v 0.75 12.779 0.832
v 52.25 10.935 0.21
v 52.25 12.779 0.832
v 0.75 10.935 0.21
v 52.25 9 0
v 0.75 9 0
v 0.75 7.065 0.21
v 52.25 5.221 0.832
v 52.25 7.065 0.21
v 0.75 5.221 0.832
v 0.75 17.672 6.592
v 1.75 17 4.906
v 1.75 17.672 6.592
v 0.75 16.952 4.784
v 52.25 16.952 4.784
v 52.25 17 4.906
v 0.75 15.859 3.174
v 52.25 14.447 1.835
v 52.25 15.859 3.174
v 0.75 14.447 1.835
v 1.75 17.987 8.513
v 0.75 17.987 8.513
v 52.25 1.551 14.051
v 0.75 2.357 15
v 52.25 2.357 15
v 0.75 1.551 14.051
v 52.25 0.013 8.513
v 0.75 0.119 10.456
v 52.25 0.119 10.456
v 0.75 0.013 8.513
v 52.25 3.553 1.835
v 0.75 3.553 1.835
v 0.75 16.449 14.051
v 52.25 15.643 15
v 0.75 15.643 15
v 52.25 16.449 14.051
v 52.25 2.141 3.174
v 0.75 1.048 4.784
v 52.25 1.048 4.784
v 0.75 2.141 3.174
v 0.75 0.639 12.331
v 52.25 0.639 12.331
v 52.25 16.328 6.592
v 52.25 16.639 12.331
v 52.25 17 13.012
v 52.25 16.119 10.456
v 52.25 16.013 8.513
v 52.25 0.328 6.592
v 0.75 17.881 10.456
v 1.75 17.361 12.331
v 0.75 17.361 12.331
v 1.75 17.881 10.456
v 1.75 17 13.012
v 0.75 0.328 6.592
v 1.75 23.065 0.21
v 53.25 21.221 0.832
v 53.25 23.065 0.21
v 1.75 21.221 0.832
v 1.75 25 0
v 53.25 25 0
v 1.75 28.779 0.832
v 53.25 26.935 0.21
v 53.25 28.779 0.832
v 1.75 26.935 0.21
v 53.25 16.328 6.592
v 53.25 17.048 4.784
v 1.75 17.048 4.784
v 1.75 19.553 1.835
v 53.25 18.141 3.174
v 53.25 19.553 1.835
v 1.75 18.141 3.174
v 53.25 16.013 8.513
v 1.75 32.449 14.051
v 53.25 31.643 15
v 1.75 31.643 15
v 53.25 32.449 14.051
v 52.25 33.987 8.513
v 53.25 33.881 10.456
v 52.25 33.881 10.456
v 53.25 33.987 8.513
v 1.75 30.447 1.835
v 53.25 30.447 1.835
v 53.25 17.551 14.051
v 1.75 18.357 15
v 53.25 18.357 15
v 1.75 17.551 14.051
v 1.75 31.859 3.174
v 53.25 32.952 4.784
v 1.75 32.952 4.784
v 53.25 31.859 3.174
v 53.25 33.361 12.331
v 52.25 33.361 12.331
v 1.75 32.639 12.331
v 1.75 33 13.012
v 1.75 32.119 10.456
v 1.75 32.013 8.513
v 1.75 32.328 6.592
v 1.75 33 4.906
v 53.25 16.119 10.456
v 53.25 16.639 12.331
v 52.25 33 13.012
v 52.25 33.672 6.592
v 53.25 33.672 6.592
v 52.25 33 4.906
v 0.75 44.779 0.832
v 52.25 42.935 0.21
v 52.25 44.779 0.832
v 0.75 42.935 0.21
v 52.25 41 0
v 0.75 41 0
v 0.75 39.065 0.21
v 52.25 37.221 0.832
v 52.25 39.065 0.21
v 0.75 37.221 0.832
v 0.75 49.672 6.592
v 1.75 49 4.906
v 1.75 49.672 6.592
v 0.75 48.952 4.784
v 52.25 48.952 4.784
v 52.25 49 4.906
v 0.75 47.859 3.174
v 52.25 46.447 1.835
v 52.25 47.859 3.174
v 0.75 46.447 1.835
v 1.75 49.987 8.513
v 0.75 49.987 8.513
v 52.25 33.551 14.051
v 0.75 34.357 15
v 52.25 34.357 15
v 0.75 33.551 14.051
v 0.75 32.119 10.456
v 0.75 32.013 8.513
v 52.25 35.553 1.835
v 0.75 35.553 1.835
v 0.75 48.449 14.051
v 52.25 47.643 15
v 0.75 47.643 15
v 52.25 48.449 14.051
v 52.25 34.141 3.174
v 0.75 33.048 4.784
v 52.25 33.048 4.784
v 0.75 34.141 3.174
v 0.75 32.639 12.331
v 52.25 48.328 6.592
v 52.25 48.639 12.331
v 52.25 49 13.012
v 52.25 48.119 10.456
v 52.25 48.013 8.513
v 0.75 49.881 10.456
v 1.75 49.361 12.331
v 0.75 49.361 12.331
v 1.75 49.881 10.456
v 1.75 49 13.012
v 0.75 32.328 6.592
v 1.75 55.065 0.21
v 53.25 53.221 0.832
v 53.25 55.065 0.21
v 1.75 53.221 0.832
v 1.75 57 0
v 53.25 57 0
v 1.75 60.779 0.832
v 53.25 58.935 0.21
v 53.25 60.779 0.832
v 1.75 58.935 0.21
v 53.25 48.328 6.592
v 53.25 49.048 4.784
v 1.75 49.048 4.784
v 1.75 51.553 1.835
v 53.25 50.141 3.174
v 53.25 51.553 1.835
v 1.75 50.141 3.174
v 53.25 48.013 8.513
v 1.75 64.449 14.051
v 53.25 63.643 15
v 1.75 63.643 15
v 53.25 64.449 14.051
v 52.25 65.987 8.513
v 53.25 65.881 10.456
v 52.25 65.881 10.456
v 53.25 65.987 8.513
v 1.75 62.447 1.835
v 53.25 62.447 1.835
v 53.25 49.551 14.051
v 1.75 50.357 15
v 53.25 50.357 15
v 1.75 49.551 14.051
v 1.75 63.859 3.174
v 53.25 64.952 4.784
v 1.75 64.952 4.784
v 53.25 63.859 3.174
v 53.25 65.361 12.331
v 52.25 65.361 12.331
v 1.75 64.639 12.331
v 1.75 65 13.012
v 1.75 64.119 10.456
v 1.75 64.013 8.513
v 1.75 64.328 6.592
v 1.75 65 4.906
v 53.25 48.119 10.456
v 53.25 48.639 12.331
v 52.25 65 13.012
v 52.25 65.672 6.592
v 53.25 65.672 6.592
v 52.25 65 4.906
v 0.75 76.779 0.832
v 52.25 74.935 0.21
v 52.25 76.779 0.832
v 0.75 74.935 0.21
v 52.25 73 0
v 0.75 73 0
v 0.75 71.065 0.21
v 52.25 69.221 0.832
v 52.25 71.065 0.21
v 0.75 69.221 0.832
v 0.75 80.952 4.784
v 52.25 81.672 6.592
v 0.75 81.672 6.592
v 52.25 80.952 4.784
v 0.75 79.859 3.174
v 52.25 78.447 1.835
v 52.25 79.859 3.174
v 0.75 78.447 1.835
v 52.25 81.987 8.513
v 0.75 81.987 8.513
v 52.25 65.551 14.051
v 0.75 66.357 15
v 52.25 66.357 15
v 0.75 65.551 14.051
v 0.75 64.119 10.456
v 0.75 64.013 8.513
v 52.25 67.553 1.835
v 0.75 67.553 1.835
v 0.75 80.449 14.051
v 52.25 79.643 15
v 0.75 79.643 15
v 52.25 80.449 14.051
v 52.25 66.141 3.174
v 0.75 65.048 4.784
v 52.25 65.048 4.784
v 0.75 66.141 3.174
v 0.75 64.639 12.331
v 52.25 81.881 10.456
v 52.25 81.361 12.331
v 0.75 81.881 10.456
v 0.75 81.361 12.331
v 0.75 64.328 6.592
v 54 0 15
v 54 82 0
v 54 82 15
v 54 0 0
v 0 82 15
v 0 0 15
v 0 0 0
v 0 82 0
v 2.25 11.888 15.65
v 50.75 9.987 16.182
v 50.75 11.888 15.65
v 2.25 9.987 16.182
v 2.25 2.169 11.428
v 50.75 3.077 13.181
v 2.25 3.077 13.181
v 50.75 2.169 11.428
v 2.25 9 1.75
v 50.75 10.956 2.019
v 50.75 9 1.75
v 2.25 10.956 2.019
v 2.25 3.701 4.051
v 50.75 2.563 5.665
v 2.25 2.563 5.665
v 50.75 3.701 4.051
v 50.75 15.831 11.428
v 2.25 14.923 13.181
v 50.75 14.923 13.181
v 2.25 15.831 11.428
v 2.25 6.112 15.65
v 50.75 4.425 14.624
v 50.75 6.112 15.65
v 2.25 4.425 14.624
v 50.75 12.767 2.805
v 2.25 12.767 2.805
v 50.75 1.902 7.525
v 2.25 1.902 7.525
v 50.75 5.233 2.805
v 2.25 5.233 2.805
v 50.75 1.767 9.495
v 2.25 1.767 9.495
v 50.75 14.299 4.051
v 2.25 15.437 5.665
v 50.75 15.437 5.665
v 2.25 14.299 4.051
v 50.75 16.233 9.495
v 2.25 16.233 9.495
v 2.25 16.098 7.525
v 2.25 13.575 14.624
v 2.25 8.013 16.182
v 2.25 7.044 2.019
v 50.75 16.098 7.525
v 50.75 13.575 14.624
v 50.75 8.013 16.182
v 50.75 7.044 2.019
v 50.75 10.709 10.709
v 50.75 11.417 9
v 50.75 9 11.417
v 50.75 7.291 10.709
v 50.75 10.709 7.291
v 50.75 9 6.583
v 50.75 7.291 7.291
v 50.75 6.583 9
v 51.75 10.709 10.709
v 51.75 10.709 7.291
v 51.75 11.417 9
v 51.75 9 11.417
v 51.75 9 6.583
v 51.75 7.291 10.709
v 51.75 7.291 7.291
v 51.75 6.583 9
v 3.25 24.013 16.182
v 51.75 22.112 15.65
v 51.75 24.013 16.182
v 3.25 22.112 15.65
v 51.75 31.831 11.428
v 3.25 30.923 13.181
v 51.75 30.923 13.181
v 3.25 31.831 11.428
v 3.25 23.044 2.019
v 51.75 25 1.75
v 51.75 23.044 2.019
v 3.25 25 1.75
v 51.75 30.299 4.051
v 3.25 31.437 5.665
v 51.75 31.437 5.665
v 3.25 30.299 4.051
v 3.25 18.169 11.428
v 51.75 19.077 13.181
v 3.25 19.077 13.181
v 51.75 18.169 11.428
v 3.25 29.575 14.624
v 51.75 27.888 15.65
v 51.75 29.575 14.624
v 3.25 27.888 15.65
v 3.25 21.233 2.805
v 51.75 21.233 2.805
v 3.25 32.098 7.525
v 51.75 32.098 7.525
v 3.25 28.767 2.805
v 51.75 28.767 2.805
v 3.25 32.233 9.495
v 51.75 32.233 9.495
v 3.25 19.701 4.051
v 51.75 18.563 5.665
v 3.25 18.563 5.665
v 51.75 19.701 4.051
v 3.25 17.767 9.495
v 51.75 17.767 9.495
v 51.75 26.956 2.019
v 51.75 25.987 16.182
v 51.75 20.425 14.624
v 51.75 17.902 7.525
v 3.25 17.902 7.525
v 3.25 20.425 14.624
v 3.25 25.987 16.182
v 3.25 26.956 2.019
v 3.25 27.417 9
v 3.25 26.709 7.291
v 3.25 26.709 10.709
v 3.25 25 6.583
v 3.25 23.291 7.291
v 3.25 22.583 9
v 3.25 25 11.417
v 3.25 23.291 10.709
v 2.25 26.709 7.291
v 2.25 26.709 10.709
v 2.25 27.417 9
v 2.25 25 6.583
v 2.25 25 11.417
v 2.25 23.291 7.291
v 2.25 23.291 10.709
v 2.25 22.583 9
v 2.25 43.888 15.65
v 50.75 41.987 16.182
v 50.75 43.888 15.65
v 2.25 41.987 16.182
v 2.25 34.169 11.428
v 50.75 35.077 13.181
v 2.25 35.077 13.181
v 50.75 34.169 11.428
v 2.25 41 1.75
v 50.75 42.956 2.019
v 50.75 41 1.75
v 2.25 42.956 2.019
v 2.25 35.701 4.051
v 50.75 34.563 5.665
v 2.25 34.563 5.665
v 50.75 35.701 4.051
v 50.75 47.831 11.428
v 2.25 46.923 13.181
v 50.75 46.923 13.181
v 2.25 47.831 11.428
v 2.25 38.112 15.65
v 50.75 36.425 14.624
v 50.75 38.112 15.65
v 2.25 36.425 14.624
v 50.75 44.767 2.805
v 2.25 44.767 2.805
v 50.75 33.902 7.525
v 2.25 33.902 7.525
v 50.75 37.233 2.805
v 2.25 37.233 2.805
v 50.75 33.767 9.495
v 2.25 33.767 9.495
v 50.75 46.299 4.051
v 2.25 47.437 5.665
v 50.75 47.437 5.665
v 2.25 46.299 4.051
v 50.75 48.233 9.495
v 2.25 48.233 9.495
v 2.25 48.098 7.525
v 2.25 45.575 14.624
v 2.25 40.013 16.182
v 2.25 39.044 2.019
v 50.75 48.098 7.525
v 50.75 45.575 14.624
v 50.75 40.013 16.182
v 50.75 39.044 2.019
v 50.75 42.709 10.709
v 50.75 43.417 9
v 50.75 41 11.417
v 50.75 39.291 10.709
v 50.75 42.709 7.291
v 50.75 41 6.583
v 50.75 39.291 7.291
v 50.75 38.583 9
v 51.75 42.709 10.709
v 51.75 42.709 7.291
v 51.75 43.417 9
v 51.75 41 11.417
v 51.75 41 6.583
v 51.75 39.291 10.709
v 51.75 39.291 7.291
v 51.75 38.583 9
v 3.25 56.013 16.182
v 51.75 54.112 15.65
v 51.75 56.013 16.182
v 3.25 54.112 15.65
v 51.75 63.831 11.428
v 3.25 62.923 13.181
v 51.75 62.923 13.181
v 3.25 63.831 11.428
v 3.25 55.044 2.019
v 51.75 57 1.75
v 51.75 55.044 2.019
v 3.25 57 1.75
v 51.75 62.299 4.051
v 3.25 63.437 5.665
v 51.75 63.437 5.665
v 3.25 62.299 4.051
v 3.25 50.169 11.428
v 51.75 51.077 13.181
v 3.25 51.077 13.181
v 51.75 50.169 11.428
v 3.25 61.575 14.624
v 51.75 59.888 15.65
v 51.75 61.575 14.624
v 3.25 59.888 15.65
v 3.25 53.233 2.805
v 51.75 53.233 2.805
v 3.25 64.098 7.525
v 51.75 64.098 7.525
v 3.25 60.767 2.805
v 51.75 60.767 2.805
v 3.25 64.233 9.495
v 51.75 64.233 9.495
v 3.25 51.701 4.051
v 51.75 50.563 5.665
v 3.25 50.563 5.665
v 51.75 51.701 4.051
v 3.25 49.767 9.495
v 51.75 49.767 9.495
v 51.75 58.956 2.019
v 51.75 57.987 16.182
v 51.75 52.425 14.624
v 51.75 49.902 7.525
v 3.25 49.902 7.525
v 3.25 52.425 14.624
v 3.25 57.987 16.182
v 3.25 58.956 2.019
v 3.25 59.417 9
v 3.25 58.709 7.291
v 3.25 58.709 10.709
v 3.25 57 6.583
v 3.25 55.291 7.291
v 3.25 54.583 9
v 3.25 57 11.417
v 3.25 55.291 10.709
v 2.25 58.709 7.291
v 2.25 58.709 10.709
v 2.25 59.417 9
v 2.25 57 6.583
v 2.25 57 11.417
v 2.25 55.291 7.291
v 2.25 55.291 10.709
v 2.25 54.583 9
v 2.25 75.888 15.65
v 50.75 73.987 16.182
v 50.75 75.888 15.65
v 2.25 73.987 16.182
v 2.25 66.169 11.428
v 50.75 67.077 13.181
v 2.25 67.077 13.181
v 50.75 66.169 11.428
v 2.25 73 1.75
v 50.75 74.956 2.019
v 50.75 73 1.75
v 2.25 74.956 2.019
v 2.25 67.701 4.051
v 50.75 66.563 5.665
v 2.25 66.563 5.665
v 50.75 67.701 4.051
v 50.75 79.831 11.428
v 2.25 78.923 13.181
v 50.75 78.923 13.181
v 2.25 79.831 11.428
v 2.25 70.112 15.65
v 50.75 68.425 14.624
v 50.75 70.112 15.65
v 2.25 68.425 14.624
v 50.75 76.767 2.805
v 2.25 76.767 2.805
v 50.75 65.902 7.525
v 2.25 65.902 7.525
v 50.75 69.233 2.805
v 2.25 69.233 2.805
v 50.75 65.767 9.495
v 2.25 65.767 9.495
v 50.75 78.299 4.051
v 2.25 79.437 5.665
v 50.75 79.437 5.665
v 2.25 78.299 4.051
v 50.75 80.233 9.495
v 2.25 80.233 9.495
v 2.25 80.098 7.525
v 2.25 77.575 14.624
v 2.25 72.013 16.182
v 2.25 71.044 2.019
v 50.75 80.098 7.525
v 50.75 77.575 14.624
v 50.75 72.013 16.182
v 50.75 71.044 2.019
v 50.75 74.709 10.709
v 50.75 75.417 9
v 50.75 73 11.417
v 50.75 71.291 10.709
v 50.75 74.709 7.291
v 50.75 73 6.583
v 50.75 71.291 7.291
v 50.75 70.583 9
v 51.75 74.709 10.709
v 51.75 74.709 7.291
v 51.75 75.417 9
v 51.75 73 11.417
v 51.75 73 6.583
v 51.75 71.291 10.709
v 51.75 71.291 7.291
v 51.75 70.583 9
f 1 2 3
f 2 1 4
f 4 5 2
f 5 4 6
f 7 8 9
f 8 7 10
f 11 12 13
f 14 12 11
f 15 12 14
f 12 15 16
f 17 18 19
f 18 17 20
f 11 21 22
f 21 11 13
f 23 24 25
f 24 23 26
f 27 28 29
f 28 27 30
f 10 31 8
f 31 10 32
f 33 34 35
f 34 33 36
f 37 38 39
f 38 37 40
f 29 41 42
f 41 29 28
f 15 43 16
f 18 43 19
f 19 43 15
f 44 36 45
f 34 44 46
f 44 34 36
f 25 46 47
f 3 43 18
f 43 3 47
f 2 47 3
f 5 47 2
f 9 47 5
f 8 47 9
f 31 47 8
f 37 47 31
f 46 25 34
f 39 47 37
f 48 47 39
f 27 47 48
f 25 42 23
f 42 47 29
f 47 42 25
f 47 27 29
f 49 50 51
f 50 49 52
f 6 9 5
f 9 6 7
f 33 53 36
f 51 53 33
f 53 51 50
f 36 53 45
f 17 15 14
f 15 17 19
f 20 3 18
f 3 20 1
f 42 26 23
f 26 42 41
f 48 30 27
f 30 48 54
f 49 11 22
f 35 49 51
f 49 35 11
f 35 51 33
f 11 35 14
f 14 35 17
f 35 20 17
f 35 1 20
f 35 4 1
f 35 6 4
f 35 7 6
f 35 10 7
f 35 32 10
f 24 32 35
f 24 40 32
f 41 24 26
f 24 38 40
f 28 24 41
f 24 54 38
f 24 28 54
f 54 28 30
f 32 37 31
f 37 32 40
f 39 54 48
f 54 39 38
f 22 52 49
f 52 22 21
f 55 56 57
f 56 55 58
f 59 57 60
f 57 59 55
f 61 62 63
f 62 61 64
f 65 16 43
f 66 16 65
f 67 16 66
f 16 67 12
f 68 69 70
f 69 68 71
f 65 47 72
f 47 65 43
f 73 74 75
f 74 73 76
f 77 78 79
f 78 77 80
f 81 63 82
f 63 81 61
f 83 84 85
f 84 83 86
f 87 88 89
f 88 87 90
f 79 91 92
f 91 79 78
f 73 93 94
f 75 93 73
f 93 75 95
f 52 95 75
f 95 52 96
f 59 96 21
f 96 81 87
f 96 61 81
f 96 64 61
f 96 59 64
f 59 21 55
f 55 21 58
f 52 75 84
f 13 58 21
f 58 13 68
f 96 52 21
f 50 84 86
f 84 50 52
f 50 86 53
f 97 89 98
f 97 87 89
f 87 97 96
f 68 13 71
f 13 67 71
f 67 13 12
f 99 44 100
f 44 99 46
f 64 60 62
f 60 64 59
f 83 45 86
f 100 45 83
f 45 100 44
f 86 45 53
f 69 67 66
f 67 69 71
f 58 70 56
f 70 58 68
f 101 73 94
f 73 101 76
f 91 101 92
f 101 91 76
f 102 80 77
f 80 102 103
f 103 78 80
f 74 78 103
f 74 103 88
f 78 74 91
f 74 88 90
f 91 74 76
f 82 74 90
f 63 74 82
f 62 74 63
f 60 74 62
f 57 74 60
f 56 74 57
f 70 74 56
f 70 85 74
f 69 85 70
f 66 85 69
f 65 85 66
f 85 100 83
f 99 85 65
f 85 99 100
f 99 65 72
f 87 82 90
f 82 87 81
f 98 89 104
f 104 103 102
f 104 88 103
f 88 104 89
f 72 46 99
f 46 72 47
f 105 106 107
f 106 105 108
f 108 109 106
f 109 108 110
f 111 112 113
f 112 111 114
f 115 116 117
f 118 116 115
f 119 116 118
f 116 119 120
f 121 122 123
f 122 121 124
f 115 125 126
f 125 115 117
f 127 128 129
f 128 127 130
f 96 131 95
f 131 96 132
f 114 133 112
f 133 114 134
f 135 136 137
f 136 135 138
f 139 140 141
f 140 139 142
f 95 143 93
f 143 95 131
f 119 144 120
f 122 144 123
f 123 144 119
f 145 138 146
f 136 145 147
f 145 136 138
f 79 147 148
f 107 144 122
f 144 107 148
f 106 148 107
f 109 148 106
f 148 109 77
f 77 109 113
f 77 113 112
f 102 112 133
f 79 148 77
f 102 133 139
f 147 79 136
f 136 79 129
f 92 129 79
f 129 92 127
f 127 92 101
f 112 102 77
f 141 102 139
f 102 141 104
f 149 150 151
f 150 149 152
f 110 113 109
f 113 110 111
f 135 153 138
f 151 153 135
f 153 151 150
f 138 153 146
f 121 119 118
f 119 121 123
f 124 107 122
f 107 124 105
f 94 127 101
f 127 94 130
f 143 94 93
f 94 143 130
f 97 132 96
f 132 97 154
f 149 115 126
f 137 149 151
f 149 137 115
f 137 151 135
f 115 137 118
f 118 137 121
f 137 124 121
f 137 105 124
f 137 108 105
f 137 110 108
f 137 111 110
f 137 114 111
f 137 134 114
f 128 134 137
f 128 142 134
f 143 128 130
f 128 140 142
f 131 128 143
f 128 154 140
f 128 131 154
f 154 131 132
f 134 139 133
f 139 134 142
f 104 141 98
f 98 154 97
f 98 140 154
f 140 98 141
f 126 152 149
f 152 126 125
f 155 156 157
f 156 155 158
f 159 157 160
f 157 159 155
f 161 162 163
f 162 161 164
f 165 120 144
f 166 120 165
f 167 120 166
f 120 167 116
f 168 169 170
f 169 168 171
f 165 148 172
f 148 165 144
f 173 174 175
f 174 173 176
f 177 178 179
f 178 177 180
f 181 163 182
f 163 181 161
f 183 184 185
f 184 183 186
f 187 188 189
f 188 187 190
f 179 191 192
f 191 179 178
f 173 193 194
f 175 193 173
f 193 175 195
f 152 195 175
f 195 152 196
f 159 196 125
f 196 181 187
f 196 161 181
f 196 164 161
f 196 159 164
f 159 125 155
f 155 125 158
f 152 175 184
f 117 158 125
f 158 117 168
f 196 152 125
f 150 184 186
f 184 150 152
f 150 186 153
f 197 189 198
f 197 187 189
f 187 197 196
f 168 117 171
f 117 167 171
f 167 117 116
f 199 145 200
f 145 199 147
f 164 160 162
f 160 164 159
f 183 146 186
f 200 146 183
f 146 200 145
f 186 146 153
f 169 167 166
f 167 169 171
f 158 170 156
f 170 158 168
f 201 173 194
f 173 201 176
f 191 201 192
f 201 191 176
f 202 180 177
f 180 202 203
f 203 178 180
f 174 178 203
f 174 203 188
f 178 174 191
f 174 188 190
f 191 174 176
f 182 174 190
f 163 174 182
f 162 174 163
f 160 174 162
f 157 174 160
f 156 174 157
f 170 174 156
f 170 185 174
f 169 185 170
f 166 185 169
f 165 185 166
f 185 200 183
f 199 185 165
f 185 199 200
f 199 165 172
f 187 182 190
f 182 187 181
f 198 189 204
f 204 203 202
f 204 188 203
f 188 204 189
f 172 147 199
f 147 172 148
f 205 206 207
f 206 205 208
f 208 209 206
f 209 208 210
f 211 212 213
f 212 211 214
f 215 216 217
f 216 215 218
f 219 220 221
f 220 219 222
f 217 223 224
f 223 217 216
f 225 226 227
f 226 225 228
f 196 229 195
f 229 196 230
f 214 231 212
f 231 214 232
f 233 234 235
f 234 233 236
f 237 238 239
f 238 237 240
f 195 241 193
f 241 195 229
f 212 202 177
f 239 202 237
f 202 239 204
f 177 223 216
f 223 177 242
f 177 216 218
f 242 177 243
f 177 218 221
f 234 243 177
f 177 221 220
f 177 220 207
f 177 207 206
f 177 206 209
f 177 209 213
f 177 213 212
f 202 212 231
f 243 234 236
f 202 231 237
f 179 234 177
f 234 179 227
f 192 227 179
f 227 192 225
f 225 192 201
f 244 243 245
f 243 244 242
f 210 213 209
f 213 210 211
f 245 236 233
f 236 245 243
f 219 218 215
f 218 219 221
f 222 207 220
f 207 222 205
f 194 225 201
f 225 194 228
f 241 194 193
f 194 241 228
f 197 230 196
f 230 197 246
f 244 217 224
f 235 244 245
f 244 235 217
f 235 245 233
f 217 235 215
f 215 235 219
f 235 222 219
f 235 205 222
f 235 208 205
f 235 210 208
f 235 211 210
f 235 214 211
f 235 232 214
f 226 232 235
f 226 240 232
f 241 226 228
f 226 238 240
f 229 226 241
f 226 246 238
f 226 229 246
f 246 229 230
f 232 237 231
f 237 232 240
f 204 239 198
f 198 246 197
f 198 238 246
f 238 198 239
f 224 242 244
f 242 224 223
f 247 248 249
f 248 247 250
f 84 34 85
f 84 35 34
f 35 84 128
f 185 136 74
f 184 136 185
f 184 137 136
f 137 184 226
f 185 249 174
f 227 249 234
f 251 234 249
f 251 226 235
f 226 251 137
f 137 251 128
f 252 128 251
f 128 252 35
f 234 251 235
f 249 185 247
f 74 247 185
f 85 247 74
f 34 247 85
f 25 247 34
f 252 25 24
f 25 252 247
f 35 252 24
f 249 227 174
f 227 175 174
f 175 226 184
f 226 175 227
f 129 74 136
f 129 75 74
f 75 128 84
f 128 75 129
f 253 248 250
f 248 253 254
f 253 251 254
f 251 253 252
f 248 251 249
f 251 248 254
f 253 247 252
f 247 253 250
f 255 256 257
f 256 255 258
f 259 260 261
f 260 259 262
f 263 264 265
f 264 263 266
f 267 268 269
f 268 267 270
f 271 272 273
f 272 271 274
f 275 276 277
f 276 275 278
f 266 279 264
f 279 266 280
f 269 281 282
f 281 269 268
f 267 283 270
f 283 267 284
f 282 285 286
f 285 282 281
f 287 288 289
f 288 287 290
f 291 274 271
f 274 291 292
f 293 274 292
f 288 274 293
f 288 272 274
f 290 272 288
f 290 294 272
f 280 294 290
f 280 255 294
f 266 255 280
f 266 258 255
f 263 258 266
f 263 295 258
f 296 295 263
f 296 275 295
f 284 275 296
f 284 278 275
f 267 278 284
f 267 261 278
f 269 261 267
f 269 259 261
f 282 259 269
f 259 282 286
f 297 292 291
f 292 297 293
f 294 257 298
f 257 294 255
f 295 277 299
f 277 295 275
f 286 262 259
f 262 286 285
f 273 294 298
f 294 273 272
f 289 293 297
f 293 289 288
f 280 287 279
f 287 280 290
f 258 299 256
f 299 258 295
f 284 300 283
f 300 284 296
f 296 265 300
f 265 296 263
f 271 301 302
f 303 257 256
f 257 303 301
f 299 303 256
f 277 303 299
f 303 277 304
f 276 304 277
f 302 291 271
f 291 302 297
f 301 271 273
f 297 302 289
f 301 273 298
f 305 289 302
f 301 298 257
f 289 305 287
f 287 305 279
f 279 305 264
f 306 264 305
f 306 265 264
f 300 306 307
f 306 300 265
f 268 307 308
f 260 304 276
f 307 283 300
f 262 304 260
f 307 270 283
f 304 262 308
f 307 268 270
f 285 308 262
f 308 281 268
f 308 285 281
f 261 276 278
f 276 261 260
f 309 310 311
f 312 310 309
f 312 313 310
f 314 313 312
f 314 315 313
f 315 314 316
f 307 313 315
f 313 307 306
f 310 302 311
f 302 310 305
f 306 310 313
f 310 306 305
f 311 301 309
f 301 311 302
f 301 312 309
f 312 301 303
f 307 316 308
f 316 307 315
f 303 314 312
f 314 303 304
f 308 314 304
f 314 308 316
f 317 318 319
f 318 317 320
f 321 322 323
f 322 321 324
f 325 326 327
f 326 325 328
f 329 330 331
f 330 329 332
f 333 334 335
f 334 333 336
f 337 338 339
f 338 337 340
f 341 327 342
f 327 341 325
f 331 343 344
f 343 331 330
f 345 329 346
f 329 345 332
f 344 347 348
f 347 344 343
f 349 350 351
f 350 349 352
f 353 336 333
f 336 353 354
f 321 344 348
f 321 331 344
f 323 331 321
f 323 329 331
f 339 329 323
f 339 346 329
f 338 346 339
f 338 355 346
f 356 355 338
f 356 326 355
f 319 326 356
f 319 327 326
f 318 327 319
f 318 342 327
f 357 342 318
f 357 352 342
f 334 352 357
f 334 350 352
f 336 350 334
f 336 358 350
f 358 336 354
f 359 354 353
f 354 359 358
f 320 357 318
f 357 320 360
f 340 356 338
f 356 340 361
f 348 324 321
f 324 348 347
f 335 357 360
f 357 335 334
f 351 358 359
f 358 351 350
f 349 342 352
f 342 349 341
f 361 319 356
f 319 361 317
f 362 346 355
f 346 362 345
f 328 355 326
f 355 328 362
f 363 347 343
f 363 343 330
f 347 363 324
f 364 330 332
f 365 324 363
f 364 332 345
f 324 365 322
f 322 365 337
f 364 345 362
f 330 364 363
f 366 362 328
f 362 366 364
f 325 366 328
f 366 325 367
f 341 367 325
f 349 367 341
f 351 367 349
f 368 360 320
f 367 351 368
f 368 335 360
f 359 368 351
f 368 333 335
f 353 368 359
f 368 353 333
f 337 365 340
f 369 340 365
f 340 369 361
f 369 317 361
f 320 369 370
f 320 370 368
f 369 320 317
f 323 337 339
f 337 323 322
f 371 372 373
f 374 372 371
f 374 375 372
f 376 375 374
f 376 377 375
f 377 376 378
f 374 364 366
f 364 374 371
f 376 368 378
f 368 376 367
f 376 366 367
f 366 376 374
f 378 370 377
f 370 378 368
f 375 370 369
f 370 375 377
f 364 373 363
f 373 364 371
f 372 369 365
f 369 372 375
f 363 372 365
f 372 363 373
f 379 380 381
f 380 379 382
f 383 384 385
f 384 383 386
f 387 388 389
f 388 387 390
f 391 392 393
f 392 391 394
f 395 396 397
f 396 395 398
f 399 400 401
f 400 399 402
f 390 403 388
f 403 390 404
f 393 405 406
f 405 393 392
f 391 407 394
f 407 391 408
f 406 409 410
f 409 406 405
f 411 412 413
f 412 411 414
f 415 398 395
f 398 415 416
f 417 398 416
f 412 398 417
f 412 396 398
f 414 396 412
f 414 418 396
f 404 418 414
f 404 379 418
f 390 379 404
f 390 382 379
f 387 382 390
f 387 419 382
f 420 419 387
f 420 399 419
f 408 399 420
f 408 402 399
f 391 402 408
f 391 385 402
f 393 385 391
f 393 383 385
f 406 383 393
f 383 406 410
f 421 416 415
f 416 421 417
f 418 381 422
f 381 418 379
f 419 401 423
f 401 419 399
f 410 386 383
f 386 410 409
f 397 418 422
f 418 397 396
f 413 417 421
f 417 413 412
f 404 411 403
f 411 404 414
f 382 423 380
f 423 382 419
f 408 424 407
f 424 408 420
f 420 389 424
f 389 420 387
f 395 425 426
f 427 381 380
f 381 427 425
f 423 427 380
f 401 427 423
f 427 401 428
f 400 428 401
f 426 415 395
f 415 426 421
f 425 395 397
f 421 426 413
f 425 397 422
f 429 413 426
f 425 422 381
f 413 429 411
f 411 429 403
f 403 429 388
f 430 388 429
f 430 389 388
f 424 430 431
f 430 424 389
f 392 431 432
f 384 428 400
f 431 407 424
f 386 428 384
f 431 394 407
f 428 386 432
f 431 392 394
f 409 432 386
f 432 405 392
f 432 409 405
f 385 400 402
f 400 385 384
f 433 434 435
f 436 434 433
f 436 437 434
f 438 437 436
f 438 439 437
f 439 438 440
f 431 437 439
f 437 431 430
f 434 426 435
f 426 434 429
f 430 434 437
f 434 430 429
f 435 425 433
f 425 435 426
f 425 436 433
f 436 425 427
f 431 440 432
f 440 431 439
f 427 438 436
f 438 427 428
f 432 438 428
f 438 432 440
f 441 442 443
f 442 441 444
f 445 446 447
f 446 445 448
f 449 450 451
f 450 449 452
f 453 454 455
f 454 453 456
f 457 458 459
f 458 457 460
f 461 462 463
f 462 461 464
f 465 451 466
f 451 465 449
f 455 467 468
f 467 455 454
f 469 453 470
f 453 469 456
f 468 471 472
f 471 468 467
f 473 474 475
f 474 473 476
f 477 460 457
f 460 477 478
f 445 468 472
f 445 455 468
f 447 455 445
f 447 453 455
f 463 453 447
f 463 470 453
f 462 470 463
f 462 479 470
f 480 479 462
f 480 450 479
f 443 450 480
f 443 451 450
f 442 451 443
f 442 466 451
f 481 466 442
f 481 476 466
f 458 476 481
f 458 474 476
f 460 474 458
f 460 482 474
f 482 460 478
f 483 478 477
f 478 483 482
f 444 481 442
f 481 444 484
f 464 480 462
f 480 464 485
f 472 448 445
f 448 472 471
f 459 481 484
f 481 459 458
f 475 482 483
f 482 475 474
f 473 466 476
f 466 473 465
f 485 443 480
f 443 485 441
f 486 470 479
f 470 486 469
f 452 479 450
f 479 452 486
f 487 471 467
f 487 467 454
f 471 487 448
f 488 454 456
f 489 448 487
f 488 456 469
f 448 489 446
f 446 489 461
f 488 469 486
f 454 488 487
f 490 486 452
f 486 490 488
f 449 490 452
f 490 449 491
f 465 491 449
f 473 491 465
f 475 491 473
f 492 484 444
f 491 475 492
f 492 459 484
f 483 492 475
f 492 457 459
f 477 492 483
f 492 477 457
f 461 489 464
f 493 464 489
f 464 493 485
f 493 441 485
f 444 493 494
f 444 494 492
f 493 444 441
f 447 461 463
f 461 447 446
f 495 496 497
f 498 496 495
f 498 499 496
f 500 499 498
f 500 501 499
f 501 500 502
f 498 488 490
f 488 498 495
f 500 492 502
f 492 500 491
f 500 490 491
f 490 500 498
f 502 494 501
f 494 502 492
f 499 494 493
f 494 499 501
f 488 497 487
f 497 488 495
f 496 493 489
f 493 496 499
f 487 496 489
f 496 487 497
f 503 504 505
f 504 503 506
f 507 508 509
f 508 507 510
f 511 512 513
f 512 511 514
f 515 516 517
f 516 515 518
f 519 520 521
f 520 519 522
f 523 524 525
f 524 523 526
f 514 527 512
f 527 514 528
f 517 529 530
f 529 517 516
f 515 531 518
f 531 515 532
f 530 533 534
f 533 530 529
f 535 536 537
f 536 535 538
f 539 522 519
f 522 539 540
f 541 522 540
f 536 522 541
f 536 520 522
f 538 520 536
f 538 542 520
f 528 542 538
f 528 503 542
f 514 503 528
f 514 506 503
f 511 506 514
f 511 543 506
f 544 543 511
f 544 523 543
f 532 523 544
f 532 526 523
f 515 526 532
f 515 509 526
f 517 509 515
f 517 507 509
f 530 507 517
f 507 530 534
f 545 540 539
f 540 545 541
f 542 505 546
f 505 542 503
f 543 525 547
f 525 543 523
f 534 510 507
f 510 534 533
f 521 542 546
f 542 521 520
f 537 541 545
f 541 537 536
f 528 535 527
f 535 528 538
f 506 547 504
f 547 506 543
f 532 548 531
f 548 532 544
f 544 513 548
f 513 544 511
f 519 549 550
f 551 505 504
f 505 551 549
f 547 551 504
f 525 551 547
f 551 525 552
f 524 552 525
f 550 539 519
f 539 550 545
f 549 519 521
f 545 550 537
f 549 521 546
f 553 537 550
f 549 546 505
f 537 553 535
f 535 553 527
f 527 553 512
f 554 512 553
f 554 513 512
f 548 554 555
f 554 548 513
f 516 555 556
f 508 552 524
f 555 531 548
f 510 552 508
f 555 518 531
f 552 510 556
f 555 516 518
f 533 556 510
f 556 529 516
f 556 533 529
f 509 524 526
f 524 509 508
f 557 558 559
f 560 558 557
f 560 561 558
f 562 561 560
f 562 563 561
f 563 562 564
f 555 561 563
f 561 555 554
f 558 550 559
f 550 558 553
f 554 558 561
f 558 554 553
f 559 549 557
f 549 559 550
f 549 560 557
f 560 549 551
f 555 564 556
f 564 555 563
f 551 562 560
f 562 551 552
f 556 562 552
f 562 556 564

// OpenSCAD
// http://cl.ly/image/461R2T1m1B3a

module battery(height, width) {
  radius = width/2;

  union() {
    translate([0,0,-1.5])cylinder(h=height-1.5, r=radius, center=true);
    translate([0,0,23]) cylinder(h=1.5, r=radius/3, center=true);
  }
}

module aa_holder_x5() {
  difference() {
    cube([54,82,15]);
    translate([28,9,9])  rotate([0,90,0])   battery(53,18);
    translate([26,25,9]) rotate([180,90,0]) battery(53,18);
    translate([28,41,9]) rotate([0,90,0])   battery(53,18);
    translate([26,57,9]) rotate([180,90,0]) battery(53,18);
    translate([28,73,9]) rotate([0,90,0])   battery(53,18);
  }

  translate([28,9,9])  rotate([0,90,0])   battery(50,14.5);
  translate([26,25,9]) rotate([180,90,0]) battery(50,14.5);
  translate([28,41,9]) rotate([0,90,0])   battery(50,14.5);
  translate([26,57,9]) rotate([180,90,0]) battery(50,14.5);
  translate([28,73,9]) rotate([0,90,0])   battery(50,14.5);
}

aa_holder_x5();
